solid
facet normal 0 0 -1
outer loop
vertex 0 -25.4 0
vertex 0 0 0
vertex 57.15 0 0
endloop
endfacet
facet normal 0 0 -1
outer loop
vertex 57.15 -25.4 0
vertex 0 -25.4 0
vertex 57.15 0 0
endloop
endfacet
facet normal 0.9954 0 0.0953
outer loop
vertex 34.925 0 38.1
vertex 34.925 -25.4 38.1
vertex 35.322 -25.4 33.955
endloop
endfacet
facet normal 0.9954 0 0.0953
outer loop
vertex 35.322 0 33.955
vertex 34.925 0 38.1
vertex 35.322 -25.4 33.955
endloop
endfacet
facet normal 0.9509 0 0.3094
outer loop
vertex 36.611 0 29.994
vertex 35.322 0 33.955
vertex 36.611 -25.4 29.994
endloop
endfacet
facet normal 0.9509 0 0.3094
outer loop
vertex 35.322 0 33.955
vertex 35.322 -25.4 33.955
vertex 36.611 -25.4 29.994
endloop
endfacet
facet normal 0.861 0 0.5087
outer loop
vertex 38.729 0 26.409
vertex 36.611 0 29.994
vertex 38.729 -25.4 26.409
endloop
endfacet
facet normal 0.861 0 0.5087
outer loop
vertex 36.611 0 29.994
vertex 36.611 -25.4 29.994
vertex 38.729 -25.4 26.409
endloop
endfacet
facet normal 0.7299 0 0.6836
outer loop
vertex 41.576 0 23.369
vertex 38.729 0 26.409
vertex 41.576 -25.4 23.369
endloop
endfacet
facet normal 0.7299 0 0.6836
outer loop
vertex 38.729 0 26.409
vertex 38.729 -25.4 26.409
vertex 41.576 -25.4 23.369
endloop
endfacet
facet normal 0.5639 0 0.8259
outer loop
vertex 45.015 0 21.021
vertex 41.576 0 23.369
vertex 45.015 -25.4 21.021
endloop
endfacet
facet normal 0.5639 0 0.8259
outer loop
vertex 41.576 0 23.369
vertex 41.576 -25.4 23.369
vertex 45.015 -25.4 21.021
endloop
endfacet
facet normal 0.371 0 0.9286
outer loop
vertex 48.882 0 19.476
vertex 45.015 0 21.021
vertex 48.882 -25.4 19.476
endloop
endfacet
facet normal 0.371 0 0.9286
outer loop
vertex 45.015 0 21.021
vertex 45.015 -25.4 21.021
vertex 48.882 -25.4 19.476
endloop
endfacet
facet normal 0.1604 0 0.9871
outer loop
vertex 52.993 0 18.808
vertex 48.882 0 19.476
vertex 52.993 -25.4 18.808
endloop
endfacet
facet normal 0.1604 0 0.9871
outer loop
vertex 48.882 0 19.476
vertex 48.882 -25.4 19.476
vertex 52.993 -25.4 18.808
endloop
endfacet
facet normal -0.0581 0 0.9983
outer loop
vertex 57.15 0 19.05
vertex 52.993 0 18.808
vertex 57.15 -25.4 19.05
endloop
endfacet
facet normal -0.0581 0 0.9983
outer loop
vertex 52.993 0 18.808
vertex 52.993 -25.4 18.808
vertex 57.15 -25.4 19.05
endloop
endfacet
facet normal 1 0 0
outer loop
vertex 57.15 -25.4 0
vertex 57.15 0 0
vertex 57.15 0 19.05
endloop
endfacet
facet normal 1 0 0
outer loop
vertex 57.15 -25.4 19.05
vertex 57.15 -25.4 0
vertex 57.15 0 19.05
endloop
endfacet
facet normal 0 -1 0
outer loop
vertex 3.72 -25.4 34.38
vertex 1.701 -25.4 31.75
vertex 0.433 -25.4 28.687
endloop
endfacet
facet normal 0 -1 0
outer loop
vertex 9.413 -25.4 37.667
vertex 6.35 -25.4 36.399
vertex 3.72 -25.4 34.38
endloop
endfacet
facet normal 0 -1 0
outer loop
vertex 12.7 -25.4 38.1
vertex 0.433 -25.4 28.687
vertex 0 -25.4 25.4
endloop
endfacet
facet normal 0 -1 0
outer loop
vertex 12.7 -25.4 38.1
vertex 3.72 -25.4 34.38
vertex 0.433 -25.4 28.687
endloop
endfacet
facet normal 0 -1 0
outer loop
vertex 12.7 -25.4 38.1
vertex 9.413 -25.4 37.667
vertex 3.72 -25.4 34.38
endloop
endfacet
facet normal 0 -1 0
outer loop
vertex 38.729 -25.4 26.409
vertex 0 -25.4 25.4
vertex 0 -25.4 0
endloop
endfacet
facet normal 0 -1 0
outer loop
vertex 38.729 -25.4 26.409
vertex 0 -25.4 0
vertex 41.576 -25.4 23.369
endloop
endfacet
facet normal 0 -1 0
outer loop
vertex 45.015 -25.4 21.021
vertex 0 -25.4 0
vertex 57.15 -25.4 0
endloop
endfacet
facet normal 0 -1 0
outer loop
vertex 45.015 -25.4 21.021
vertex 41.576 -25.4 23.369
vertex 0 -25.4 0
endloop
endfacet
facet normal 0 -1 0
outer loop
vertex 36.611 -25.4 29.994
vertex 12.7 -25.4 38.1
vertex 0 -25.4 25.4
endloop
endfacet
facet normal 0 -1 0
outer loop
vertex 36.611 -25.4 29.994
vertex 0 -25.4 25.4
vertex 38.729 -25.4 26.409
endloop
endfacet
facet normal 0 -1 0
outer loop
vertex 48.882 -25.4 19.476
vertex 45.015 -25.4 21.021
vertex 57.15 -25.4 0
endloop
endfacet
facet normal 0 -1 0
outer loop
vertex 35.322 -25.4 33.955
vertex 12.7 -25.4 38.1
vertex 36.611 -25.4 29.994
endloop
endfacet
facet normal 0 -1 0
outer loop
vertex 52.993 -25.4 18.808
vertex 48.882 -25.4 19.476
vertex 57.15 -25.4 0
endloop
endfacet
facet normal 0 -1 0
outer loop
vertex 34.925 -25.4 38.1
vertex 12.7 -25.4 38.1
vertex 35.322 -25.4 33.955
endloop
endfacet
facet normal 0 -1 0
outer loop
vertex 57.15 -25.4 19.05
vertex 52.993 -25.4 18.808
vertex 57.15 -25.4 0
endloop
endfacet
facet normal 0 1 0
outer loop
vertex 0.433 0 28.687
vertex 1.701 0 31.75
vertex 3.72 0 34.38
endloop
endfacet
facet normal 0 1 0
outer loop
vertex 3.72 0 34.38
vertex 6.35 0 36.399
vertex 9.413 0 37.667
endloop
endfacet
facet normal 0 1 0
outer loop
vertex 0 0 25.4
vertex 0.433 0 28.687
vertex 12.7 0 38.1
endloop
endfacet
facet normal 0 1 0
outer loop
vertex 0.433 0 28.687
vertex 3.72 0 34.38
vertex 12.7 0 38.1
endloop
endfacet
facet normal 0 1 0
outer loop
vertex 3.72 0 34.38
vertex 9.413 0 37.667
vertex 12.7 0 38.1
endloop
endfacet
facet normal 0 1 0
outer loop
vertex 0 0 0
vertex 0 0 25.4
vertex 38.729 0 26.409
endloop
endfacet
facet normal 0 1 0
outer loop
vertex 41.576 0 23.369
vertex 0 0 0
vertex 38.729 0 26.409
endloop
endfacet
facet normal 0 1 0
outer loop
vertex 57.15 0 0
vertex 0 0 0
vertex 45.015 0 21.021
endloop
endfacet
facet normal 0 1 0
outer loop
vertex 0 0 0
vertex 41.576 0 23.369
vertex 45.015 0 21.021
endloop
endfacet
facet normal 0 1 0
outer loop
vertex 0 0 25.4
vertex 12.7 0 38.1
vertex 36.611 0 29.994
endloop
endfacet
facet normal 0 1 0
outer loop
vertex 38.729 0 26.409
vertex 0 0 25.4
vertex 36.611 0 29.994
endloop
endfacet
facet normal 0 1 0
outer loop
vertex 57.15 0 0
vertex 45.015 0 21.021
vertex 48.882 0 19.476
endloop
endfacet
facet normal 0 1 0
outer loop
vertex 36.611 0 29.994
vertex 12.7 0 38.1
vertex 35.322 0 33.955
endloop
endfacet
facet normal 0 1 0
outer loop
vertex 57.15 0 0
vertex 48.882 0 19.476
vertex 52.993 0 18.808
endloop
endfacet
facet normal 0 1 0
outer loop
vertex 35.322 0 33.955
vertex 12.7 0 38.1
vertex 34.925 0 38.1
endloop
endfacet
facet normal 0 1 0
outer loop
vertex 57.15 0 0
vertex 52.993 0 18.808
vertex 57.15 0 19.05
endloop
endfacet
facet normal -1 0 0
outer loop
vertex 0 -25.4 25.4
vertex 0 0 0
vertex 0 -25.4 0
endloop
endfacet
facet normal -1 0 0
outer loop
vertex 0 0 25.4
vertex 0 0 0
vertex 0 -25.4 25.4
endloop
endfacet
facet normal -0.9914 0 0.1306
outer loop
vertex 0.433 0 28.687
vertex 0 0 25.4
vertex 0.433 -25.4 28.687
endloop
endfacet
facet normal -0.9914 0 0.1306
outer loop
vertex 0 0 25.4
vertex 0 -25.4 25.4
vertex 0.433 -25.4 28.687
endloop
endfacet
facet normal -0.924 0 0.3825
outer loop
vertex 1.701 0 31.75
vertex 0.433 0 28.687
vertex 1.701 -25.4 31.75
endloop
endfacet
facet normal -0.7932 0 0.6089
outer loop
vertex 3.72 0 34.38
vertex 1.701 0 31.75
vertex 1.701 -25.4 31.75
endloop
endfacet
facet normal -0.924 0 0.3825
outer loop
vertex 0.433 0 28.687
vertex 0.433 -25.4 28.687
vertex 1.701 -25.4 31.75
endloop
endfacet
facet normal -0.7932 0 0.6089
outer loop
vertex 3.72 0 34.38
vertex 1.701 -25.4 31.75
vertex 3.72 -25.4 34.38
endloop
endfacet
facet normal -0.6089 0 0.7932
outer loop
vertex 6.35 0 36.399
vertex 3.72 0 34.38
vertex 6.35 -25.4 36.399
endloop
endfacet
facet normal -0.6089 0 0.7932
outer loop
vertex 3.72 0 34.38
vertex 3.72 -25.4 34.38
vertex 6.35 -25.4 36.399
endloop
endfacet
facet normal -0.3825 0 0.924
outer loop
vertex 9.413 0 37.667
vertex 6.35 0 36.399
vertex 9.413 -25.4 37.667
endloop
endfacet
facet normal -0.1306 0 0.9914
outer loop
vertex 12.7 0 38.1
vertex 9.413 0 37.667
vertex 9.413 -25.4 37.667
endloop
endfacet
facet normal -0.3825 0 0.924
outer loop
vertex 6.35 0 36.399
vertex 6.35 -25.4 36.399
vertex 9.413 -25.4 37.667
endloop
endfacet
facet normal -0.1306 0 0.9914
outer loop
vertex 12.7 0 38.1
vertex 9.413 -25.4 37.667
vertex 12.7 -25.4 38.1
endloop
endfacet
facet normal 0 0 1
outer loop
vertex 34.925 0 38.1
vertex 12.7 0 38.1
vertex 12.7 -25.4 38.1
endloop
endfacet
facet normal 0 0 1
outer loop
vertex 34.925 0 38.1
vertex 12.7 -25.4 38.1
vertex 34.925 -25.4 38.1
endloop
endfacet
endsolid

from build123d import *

# Parameters (mm, degrees)
F0_W     = 57.15
F0_H     = 38.1
F1_DEPTH = 25.4
F2_R     = 12.7
F4_DEPTH = 25.4


with BuildPart() as f1:
    # F0 (on Front) → F1 (new body)
    with BuildSketch(Plane.XZ):
        with Locations((28.575, 19.05)):
            Rectangle(F0_W, F0_H)
    extrude(amount=F1_DEPTH)

    # F2
    f2_edges = [f1.edges().sort_by_distance(p)[0] for p in [
        (0, -12.7, 38.1),
    ]]
    fillet(f2_edges, radius=F2_R)

    # F3 (on face) → F4 (cut)
    with BuildSketch(Plane.XZ.offset(25.4)):
        with BuildLine():
            Line((57.15, 38.1), (34.925, 38.1))
            ThreePointArc((34.925, 38.1), (41.575556, 23.369399), (57.15, 19.05))
            Line((57.15, 19.05), (57.15, 38.1))
        make_face()
    extrude(amount=-F4_DEPTH, mode=Mode.SUBTRACT)


solid = f1.part
